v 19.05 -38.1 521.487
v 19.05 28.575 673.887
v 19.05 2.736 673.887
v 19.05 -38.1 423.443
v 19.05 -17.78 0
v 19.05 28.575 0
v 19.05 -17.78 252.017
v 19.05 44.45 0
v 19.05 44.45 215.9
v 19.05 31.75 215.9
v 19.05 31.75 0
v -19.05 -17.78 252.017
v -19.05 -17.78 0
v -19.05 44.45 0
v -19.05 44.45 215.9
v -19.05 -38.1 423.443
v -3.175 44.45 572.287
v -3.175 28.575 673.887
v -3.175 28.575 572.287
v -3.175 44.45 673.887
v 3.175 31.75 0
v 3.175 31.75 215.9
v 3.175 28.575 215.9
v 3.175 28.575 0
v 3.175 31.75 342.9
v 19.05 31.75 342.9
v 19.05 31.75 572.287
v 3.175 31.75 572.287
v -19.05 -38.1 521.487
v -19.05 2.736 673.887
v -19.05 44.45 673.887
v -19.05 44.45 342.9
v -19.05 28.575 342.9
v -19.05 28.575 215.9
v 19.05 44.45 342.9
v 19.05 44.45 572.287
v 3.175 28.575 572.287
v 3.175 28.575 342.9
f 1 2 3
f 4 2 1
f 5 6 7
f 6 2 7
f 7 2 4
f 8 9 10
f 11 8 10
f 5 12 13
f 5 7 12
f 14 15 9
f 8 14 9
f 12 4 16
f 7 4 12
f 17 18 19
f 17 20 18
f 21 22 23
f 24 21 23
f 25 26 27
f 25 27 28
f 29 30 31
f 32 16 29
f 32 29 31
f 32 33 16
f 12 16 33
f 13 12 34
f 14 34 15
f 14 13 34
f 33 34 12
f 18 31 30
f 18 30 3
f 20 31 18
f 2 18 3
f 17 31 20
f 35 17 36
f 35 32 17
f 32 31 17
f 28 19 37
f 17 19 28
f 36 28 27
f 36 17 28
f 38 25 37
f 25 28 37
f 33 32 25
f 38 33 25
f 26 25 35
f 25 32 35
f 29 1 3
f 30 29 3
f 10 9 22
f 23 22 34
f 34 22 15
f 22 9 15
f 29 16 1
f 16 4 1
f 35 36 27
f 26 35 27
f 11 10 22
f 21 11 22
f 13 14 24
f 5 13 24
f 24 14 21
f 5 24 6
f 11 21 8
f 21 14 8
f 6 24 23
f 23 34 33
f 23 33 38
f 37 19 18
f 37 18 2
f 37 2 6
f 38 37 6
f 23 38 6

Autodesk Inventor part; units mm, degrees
ref_plane "YZ Plane" through (0, 0, 0) normal (1, 0, 0) x (0, 1, 0)
ref_plane "XZ Plane" through (0, 0, 0) normal (0, 1, 0) x (-1, 0, 0)
ref_plane "XY Plane" through (0, 0, 0) normal (0, 0, 1) x (1, 0, 0)
sketch "Sketch1" plane through (0, 0, 0) normal (0, 0, 1) x (1, 0, 0)
  line L0 (19.05, -44.45) -> (-19.05, -44.45)
  line L1 (-19.05, -44.45) -> (-19.05, 44.45)
  line L2 (-19.05, 44.45) -> (19.05, 44.45)
  line L3 (19.05, 44.45) -> (19.05, -44.45)
  line L4 (19.05, -44.45) -> (-19.05, 44.45) construction
  line L5 (-19.05, -44.45) -> (19.05, 44.45) construction
  point P0 (0, 0)
  dimension "d0" = 38.1
  dimension "d1" = 88.9
extrude "Extrusion1" add sketch "Sketch1" along normal blind 673.8874
sketch "Sketch2" plane through (0, 0, 673.8874) normal (0, 0, 1) x (1, 0, 0)
  line L0 (19.05, -44.45) -> (19.05, 44.45) projected
  line L1 (19.05, 44.45) -> (-19.05, 44.45) projected
  line L2 (19.05, 31.75) -> (3.175, 31.75)
  line L3 (3.175, 31.75) -> (3.175, 28.575)
  line L4 (3.175, 28.575) -> (19.05, 28.575)
  line L5 (19.05, 28.575) -> (19.05, 31.75)
  point P0 (0, 0)
  dimension "d4" = 12.7
  dimension "d5" = 3.175
  dimension "d6" = 15.875
extrude "Extrusion2" cut sketch "Sketch2" against normal blind 736.6
sketch "Sketch4" plane through (19.05, -44.45, 673.8874) normal (1, 0, 0) x (0, 0, -1)
  line L0 (0, 0) -> (0, 73.025) projected
  line L1 (673.8874, 0) -> (0, 0) projected
  line L2 (673.8874, 73.025) -> (673.8874, 0) projected
  line L3 (673.8874, 6.35) -> (0, 6.35)
  line L4 (152.4, 6.35) -> (0, 47.1855)
  line L5 (250.444, 6.35) -> (421.8705, 26.67)
  line L6 (421.8705, 26.67) -> (673.8874, 26.67)
  point P0 (673.8874, 44.45)
  dimension "d15" = 6.35
  dimension "d20" = 152.4
  dimension "d21" = 165
  dimension "d23" = 20.32
  dimension "d24" = 98.044
  dimension "d25" = 173.24
extrude "Extrusion3" cut sketch "Sketch4" against normal blind 152.4
sketch "Sketch5" plane through (-19.05, 44.45, 0) normal (0, 1, 0) x (1, 0, 0)
  line L0 (38.1, -673.8874) -> (15.875, -673.8874)
  line L1 (15.875, -673.8874) -> (15.875, -572.2874)
  line L2 (15.875, -572.2874) -> (38.1, -572.2874)
  line L3 (38.1, -572.2874) -> (38.1, -673.8874)
  point P0 (19.05, 0)
  dimension "d28" = 22.225
  dimension "d29" = 101.6
extrude "Extrusion4" cut sketch "Sketch5" against normal blind 15.875
sketch "Sketch6" plane through (-19.05, 44.45, 0) normal (0, 1, 0) x (1, 0, 0)
  line L0 (38.1, 0) -> (38.1, -572.2874) projected
  line L1 (0, 0) -> (38.1, 0) projected
  line L2 (38.1, -215.9) -> (0, -215.9)
  line L3 (0, -215.9) -> (0, -342.9)
  line L4 (0, -342.9) -> (38.1, -342.9)
  line L5 (38.1, -342.9) -> (38.1, -215.9)
  point P0 (19.05, 0)
  dimension "d32" = 127
  dimension "d33" = 215.9
  dimension "d36" = 38.1
extrude "Extrusion5" cut sketch "Sketch6" against normal blind 15.875
properties part number "FrontSkid"
